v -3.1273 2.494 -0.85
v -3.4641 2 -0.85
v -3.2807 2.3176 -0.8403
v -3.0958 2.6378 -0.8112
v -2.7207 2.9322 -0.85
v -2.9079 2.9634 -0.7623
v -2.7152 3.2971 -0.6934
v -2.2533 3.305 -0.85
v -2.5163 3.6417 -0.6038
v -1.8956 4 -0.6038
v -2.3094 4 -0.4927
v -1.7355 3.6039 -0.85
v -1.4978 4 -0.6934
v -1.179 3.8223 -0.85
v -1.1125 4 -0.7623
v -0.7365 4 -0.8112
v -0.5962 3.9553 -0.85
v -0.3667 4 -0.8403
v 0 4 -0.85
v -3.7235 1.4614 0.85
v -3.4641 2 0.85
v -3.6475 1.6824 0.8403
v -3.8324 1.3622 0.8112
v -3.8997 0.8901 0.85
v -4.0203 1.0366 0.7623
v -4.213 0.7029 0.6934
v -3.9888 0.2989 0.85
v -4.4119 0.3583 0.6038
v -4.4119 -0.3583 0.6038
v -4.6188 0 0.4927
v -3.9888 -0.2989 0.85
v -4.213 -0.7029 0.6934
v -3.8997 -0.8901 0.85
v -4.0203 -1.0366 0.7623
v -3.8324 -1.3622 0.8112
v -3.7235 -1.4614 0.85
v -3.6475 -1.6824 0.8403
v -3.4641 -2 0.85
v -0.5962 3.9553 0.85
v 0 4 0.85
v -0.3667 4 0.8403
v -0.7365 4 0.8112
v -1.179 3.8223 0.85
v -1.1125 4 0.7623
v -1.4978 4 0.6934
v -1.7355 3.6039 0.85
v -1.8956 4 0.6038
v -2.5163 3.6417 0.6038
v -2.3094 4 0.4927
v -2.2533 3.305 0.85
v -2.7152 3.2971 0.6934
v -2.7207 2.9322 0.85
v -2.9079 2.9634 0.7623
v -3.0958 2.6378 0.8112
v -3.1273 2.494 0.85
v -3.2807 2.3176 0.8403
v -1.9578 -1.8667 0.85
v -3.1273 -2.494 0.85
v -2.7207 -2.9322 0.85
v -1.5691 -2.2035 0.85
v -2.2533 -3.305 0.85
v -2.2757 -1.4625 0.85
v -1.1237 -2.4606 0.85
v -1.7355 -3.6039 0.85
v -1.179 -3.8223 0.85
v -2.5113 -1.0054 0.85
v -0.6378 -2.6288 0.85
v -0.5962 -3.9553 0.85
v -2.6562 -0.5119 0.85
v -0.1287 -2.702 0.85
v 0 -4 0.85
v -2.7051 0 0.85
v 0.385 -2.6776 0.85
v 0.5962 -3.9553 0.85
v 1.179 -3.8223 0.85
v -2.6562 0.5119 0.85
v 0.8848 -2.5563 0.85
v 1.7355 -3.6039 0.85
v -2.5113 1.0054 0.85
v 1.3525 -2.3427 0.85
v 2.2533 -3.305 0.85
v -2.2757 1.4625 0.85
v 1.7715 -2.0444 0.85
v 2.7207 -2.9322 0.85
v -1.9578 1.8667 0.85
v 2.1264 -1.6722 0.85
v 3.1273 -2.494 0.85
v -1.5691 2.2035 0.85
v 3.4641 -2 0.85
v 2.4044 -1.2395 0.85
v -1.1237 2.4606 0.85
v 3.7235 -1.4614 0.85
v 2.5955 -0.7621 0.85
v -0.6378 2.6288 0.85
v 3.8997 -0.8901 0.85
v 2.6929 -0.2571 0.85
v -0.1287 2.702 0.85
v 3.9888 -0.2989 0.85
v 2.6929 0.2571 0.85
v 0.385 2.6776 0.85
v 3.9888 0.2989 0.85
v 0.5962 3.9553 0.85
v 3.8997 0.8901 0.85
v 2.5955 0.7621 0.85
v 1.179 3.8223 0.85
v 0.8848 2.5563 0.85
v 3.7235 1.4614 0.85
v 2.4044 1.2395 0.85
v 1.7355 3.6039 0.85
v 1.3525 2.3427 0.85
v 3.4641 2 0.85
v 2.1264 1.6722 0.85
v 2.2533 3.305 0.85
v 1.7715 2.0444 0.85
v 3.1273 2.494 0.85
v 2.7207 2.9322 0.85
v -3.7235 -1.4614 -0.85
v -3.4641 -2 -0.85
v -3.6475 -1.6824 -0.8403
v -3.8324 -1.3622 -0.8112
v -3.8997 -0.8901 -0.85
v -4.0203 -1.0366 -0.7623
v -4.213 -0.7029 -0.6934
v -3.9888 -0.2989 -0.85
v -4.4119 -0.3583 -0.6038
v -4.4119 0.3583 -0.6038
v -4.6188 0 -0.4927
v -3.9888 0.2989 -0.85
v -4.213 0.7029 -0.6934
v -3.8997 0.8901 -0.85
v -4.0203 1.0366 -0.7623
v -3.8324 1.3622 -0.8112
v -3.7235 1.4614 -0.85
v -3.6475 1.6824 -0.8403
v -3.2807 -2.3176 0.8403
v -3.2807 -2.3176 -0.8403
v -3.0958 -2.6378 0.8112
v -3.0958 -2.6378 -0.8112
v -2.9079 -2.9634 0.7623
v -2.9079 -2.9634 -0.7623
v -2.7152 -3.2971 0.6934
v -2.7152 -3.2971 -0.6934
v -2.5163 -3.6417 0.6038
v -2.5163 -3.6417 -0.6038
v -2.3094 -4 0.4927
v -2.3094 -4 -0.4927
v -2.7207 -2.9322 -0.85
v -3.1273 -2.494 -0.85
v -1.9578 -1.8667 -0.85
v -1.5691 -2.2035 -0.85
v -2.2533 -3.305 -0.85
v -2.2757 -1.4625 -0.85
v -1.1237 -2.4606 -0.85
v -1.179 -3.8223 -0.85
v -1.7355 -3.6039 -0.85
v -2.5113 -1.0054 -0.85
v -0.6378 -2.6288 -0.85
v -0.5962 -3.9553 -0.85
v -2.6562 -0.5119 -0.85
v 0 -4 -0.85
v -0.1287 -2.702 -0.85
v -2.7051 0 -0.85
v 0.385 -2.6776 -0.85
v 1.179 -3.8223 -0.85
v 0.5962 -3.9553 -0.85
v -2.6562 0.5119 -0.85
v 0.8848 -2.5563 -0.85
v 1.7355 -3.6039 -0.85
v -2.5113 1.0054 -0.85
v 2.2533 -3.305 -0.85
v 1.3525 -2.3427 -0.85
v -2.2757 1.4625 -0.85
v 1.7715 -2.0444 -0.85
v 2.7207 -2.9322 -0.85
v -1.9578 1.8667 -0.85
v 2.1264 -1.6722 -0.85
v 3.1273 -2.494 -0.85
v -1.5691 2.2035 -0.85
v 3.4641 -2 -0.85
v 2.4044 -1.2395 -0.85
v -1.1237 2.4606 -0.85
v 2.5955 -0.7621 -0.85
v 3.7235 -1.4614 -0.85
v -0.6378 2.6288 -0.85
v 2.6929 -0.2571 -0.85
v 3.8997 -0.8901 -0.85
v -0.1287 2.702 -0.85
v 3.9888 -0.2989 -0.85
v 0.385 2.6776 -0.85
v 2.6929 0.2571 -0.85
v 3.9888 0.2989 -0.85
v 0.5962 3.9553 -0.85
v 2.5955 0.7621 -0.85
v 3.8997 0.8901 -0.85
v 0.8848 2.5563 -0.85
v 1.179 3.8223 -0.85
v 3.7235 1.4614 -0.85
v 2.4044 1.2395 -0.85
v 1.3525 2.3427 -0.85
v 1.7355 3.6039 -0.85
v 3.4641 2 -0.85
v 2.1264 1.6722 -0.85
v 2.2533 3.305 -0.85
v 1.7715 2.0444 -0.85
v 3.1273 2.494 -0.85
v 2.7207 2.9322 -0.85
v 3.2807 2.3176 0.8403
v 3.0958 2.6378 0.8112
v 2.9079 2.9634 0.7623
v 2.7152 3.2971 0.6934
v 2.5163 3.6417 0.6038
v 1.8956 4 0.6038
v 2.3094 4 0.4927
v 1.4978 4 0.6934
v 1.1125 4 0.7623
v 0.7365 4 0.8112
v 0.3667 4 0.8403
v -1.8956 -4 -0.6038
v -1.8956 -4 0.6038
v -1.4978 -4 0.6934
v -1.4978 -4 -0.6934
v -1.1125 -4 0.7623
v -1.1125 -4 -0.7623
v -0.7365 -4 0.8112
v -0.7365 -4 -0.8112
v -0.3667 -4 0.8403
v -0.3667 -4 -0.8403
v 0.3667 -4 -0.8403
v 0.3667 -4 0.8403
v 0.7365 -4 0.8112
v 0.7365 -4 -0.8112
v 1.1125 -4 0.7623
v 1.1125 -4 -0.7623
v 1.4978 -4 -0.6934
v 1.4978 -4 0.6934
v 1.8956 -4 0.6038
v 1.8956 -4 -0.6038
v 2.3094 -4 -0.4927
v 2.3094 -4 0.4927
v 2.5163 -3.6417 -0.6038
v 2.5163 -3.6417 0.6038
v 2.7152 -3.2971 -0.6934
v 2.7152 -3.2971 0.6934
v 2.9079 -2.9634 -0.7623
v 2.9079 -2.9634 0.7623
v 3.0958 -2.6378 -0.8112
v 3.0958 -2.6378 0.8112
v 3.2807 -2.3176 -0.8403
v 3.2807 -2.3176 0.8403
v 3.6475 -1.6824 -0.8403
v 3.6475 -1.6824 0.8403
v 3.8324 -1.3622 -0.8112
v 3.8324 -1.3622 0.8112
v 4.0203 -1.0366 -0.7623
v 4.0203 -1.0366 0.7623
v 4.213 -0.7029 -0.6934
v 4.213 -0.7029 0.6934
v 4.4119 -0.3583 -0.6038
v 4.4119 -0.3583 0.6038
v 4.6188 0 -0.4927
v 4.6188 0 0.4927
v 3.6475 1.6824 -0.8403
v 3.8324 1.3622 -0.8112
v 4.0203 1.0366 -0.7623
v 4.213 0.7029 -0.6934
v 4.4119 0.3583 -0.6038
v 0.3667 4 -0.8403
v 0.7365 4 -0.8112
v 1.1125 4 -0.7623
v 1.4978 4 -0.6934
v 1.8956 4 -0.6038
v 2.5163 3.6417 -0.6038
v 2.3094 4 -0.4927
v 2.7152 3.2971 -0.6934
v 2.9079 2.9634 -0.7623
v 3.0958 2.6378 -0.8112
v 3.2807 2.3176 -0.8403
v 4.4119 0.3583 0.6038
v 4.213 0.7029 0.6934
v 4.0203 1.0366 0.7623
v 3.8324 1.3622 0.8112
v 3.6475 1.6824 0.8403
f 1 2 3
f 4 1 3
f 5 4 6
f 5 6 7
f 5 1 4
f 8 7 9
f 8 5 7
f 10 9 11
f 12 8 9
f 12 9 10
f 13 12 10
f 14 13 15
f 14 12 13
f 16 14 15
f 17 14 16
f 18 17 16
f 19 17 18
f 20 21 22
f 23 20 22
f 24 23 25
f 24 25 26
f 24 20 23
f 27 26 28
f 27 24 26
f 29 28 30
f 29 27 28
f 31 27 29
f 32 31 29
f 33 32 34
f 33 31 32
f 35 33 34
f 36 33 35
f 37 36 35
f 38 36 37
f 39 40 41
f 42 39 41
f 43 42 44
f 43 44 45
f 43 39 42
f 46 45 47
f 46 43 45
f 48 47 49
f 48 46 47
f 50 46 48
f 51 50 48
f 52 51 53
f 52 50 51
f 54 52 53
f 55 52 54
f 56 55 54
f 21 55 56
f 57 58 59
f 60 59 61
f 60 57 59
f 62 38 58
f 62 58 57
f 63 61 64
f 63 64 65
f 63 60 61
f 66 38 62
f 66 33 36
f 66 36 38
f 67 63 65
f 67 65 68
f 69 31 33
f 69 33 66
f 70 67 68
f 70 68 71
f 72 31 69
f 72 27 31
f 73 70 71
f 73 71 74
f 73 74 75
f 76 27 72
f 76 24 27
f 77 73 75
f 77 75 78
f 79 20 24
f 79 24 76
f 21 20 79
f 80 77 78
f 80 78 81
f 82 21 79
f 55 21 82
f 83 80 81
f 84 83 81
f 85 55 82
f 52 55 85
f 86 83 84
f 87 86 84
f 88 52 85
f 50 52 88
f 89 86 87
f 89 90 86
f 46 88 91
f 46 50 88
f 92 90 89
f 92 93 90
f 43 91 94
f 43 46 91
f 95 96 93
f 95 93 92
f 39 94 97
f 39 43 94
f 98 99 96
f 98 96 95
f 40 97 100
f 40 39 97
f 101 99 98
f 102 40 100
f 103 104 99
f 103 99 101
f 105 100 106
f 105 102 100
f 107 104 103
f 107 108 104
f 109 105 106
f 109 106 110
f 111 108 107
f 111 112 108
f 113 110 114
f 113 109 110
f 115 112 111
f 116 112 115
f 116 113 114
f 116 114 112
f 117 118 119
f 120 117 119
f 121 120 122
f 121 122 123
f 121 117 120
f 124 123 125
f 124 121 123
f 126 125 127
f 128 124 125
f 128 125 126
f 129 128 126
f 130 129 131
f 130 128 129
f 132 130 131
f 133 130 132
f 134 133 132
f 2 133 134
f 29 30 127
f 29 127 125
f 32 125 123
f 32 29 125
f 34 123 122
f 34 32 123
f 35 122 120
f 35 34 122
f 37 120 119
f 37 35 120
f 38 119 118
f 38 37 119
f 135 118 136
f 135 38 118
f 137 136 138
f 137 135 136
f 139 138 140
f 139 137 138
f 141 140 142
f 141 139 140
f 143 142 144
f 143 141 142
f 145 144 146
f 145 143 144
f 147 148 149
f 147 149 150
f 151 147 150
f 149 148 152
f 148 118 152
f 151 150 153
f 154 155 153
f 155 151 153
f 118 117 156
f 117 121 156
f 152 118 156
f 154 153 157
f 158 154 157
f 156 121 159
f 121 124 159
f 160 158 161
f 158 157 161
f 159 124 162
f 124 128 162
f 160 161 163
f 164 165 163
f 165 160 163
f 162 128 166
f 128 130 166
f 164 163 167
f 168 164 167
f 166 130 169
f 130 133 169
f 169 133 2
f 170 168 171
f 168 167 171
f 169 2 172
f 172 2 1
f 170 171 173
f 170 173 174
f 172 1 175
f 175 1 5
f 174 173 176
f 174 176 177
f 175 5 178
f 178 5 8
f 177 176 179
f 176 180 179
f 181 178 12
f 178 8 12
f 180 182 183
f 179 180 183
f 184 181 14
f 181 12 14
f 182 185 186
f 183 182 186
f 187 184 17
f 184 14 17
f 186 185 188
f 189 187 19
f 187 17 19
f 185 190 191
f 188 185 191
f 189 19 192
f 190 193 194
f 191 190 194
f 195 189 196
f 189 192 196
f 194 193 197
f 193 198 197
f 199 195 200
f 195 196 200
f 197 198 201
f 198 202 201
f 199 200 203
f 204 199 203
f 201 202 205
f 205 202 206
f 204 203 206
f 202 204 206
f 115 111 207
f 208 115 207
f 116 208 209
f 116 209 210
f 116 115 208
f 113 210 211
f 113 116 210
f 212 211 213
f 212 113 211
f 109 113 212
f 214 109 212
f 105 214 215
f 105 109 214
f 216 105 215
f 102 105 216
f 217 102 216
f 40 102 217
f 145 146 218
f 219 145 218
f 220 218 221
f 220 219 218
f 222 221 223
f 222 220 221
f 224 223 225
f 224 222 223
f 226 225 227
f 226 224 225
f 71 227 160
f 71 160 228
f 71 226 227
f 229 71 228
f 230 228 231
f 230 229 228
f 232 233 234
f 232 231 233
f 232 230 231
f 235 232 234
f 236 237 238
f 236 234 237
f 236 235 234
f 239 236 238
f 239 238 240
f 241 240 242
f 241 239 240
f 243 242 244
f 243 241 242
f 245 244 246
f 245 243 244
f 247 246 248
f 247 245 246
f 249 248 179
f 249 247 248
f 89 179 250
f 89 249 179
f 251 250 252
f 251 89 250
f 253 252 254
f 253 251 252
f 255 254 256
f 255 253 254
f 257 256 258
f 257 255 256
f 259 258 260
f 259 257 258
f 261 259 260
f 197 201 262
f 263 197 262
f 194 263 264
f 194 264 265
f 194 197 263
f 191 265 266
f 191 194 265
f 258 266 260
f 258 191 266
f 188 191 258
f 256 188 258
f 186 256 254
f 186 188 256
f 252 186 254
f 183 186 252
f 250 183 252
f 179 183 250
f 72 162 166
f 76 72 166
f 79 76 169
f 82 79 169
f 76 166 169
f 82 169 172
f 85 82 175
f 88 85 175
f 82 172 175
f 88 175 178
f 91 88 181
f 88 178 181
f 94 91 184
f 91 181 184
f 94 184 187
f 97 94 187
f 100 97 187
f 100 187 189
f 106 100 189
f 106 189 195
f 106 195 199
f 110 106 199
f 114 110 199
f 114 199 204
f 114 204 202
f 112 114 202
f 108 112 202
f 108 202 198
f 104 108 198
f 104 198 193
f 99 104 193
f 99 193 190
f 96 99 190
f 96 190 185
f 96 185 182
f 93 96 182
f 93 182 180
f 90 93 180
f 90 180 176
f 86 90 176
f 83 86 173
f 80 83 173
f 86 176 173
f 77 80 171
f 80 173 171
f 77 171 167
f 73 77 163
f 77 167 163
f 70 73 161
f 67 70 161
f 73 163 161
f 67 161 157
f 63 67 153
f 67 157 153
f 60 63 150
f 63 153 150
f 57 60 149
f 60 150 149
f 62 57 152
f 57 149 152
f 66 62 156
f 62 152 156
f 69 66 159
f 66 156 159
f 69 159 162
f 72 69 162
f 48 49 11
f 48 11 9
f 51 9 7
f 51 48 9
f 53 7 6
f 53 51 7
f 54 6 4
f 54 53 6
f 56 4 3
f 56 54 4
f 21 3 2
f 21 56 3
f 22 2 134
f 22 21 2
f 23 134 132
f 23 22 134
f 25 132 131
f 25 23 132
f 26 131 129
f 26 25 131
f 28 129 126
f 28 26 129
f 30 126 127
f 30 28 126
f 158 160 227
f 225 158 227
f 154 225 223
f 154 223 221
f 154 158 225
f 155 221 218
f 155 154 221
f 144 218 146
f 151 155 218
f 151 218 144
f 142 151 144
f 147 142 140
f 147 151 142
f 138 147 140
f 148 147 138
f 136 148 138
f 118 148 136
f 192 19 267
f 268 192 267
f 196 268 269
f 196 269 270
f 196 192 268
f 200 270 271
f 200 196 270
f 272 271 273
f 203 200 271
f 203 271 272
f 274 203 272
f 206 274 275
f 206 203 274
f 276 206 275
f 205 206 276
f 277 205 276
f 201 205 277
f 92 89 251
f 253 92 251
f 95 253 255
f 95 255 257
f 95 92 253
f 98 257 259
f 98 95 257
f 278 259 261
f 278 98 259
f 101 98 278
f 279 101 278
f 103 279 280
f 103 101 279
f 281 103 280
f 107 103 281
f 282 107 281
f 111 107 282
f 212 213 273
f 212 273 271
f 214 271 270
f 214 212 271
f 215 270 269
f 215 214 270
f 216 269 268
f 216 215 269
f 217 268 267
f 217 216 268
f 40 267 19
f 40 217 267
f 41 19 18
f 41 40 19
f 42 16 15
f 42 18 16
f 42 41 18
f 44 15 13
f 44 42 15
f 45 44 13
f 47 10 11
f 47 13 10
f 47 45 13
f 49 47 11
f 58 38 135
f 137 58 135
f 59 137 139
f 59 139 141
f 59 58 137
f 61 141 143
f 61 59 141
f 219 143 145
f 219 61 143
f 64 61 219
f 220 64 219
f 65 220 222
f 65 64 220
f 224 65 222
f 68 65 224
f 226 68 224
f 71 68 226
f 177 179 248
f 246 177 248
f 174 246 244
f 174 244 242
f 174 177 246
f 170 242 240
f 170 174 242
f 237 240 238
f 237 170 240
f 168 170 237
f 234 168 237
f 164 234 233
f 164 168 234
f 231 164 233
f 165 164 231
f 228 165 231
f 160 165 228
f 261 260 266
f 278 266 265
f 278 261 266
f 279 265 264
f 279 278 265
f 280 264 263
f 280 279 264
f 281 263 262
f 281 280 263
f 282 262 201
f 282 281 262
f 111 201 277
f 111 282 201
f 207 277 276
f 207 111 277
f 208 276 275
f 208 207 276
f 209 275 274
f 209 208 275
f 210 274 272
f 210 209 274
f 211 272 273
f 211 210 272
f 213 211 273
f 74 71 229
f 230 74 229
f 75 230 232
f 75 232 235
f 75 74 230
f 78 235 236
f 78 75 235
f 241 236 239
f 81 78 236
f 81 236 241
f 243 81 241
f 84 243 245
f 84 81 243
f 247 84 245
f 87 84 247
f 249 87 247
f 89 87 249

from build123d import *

# Parameters (mm, degrees)
BOSS_EXTRUDE1_DEPTH       = 0.85
SKETCH2_R                 = 15
SKETCH2_R_2               = 4
CUT_EXTRUDE_THIN2_DEPTH   = 1
CUT_EXTRUDE_THIN2_DRAFT   = -60
MIRROR1_COPY_1_SKETCH_R   = 15
MIRROR1_COPY_1_SKETCH_R_2 = 4
MIRROR1_COPY_1_DEPTH      = 1
MIRROR1_COPY_1_DRAFT      = -60
F_1_4_28_TAPPED_HOLE1_D   = 5.4102


with BuildPart() as part:
    # Sketch1 → Boss-Extrude1 (new, symmetric)
    with BuildSketch(Plane.XY):
        Polygon((2.309401077, 4), (-2.309401077, 4), (-4.618802154, 0), (-2.309401077, -4), (2.309401077, -4), (4.618802154, 0), align=None)
    extrude(amount=BOSS_EXTRUDE1_DEPTH, both=True)


with BuildPart() as cut_extrude_thin2_tool:
    # Sketch2 → Cut-Extrude-Thin2 (with draft: the straight prism first)
    with BuildSketch(Plane.XY.offset(0.85)):
        Circle(SKETCH2_R)
        Circle(SKETCH2_R_2, mode=Mode.SUBTRACT)
    extrude(amount=-CUT_EXTRUDE_THIN2_DEPTH)
    # Cut-Extrude-Thin2: the draft: its side faces are tilted about the plane it starts from
    cut_extrude_thin2_sides = [cut_extrude_thin2_tool.faces().sort_by_distance(p)[0] for p in [
        (-15, 0, 0.35),
        (-4, 0, 0.35),
    ]]
    draft(cut_extrude_thin2_sides, Plane.XY.offset(0.85), CUT_EXTRUDE_THIN2_DRAFT)


with BuildPart() as part_1:
    add(part.part)

    # Cut-Extrude-Thin2: cut by cut_extrude_thin2_tool
    add(cut_extrude_thin2_tool.part, mode=Mode.SUBTRACT)


with BuildPart() as mirror1_copy_1_tool:
    # Mirror1 copy 1 sketch → Mirror1 copy 1 (with draft: the straight prism first)
    with BuildSketch(Plane(origin=(0, 0, -0.85), x_dir=(1, 0, 0), z_dir=(0, 0, -1))):
        Circle(MIRROR1_COPY_1_SKETCH_R)
        Circle(MIRROR1_COPY_1_SKETCH_R_2, mode=Mode.SUBTRACT)
    extrude(amount=-MIRROR1_COPY_1_DEPTH)
    # Mirror1 copy 1: the draft: its side faces are tilted about the plane it starts from
    mirror1_copy_1_sides = [mirror1_copy_1_tool.faces().sort_by_distance(p)[0] for p in [
        (-15, 0, -0.35),
        (-4, 0, -0.35),
    ]]
    draft(mirror1_copy_1_sides, Plane(origin=(0, 0, -0.85), x_dir=(1, 0, 0), z_dir=(0, 0, -1)), MIRROR1_COPY_1_DRAFT)


with BuildPart() as part_2:
    add(part_1.part)

    # Mirror1 copy 1: cut by mirror1_copy_1_tool
    add(mirror1_copy_1_tool.part, mode=Mode.SUBTRACT)

    # 1/4-28 Tapped Hole1 (through all)
    with Locations(Plane.XY.offset(0.85)):
        with Locations((0, 0)):
            Hole(F_1_4_28_TAPPED_HOLE1_D / 2)


solid = part_2.part
